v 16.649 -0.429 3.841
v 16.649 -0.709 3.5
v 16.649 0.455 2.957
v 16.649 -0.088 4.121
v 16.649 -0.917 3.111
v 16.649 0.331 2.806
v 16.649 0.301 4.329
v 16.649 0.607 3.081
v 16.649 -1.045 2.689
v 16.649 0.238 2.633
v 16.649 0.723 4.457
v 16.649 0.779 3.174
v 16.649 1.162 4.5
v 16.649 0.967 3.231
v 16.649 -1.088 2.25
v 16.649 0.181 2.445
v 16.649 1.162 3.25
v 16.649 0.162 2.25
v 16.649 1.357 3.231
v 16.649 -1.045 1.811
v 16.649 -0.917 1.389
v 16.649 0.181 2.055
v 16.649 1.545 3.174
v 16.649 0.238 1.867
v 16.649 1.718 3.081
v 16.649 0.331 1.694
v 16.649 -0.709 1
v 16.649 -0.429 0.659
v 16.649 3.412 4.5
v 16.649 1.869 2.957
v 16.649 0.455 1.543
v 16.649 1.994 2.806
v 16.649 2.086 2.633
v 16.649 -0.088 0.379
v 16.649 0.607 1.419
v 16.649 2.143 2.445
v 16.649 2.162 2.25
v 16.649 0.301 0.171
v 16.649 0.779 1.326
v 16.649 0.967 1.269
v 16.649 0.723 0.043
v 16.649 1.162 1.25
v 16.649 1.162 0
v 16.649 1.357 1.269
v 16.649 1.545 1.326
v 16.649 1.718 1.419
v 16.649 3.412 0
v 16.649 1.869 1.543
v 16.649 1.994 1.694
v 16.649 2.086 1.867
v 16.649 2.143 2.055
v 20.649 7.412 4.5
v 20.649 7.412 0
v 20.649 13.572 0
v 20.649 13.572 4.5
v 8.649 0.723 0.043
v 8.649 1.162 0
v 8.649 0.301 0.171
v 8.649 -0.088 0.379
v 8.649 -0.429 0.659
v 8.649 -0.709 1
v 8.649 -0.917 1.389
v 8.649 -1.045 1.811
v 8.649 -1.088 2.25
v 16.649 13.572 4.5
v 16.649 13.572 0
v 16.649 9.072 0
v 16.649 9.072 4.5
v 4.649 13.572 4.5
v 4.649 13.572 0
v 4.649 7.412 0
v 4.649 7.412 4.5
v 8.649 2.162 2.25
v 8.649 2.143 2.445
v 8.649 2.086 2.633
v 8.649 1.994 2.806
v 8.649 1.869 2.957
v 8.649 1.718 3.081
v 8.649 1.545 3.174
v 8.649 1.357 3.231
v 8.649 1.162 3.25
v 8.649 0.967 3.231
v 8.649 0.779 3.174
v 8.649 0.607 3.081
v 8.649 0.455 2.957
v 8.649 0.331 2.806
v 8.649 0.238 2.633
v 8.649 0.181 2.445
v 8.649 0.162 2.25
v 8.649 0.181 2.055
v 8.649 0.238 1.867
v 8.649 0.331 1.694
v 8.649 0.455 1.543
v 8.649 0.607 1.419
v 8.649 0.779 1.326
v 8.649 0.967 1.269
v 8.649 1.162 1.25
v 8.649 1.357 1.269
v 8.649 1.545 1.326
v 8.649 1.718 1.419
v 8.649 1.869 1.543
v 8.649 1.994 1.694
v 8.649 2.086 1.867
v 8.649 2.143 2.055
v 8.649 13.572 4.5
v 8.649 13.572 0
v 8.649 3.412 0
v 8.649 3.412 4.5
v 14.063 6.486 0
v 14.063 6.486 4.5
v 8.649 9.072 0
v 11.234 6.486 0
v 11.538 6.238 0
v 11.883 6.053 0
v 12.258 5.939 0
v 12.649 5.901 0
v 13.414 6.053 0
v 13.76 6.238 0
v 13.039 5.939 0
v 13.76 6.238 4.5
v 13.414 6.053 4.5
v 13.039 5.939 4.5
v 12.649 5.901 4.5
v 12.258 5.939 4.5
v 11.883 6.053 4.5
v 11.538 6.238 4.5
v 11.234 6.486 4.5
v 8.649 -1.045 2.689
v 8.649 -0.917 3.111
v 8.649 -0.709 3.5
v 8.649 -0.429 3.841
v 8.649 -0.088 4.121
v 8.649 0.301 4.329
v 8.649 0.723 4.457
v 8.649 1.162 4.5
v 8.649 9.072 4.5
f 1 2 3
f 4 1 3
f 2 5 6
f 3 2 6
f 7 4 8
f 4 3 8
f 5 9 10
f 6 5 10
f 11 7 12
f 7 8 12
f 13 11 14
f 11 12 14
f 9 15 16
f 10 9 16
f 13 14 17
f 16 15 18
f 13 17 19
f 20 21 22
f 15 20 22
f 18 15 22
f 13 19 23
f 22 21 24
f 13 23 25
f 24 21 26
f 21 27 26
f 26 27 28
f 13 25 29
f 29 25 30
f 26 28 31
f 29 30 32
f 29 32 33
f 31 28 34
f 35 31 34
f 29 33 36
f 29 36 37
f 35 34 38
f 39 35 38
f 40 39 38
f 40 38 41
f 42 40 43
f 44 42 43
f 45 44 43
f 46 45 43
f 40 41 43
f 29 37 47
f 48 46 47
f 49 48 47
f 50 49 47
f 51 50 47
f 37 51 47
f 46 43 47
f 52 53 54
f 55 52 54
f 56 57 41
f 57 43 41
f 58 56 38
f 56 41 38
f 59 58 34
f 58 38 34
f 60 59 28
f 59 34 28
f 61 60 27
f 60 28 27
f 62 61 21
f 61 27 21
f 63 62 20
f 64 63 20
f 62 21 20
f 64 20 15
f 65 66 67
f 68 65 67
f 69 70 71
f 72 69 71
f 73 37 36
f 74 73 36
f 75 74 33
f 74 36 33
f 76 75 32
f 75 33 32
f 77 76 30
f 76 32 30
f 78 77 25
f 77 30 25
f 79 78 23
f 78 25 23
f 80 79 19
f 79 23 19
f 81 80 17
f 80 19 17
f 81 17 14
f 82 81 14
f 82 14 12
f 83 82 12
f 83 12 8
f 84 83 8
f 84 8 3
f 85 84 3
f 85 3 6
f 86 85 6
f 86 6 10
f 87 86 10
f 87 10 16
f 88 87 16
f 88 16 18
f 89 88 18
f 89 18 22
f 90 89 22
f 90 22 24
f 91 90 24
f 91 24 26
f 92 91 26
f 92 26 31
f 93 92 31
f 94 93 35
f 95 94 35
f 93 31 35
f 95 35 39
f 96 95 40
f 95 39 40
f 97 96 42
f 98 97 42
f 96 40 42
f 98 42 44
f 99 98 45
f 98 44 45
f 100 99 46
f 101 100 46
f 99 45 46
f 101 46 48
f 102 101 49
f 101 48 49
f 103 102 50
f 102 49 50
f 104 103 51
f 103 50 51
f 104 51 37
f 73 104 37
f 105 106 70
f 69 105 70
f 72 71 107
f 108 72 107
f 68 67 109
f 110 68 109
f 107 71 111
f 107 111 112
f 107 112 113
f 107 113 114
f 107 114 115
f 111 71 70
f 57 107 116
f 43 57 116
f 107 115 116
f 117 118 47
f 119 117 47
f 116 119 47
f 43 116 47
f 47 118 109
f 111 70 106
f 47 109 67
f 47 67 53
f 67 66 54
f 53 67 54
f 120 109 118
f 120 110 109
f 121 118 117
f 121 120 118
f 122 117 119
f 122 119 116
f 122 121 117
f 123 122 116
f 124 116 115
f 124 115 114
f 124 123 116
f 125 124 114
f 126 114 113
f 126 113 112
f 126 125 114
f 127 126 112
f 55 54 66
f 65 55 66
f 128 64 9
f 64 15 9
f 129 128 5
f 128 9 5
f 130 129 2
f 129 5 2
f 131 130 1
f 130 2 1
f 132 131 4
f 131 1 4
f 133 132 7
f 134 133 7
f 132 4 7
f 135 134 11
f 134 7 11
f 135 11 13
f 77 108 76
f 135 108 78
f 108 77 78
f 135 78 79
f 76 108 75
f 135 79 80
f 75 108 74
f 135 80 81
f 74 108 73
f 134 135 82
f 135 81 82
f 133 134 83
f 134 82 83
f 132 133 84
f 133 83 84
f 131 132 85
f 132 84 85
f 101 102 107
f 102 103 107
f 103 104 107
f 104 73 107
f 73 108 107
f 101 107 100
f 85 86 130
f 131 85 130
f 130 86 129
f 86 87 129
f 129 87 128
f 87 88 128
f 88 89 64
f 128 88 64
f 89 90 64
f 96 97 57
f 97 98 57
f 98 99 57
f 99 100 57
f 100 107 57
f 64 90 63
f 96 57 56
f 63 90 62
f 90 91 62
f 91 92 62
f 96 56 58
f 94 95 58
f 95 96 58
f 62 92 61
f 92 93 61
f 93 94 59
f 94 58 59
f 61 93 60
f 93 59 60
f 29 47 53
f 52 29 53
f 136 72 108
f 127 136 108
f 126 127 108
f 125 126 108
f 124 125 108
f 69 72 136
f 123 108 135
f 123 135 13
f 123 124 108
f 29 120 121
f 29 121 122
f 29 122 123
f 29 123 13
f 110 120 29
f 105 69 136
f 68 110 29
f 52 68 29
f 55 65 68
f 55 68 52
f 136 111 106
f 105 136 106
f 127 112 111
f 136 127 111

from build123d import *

# Parameters (mm, degrees)
F1_DEPTH = 4.5
F2_R     = 2
F4_R     = 1
F5_DEPTH = 25
F6_R     = 2.25
F7_R     = 2.24999


# Not quite as in the source:
# - a fillet or chamfer is up to 0.001 mm smaller than in the source, because OpenCascade refuses the exact size


with BuildPart() as f1:
    # F0 (on Top) → F1 (new body)
    with BuildSketch(Plane.XY):
        Polygon((12.6486692298, 5.0720985499), (12.6486692298, -1.0879014501), (16.6486692298, -1.0879014501), (16.6486692298, 3.4120985499), (20.6486692298, 7.4120985499), (20.6486692298, 13.5720985499), (16.6486692298, 13.5720985499), (16.6486692298, 9.0720985499), align=None)
        Polygon((8.6486692298, -1.0879014501), (12.6486692298, -1.0879014501), (12.6486692298, 5.0720985499), (8.6486692298, 9.0720985499), (8.6486692298, 13.5720985499), (4.6486692298, 13.5720985499), (4.6486692298, 7.4120985499), (8.6486692298, 3.4120985499), align=None)
    extrude(amount=F1_DEPTH)

    # F2
    f2_edges = [f1.edges().sort_by_distance(p)[0] for p in [
        (12.648669, 5.072099, 2.25),
    ]]
    fillet(f2_edges, radius=F2_R)

    # F4 (on face) → F5 (cut)
    with BuildSketch(Plane.YZ.offset(16.6486692298)):
        with Locations((1.1620985499, 2.25)):
            Circle(F4_R)
    extrude(amount=-F5_DEPTH, mode=Mode.SUBTRACT)

    # F6
    f6_edges = [f1.edges().sort_by_distance(p)[0] for p in [
        (12.648669, -1.087901, 0),
    ]]
    fillet(f6_edges, radius=F6_R)

    # F7 (radius 2.25 in the source; OpenCascade refuses exactly that, so slightly less here)
    f7_edges = [f1.edges().sort_by_distance(p)[0] for p in [
        (12.648669, -1.087901, 4.5),
    ]]
    fillet(f7_edges, radius=F7_R)


solid = f1.part
